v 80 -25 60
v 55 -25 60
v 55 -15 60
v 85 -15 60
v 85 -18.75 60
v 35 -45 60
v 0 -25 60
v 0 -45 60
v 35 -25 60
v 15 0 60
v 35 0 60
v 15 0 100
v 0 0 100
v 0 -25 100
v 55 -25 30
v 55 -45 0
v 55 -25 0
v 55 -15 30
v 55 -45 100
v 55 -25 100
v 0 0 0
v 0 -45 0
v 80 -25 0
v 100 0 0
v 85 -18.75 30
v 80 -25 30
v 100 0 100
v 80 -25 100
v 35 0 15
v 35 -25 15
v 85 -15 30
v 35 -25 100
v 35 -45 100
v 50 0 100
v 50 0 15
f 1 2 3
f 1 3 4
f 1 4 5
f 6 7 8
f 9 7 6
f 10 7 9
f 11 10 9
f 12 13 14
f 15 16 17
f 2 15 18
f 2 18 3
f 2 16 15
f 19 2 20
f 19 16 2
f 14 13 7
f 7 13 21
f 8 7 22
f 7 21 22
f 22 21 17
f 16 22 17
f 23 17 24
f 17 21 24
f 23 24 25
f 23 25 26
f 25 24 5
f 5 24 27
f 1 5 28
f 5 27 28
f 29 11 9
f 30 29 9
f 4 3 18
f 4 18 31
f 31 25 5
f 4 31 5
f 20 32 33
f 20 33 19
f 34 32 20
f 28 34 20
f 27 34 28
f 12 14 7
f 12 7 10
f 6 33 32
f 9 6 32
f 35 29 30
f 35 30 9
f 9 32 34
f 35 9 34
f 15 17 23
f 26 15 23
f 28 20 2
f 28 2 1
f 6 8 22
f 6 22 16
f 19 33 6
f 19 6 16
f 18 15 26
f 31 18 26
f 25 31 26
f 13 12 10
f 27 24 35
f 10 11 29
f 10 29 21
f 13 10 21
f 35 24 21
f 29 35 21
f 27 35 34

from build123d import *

# Parameters (mm, degrees)
F0_W      = 100
F0_H      = 100
F1_DEPTH  = 45
F2_W      = 45
F2_H      = 100
F3_DEPTH  = 20
F4_W      = 35
F4_H      = 45
F5_DEPTH  = 40
F7_DEPTH  = 40
F10_DEPTH = 100.001
F8_W      = 30
F8_H      = 30
F11_DEPTH = 10
F13_DEPTH = 85


with BuildPart() as f1:
    # F0 (on Front) → F1 (new body)
    with BuildSketch(Plane.XZ):
        with Locations((50, 50)):
            Rectangle(F0_W, F0_H)
    extrude(amount=F1_DEPTH)

    # F2 (on face) → F3 (cut)
    with BuildSketch(Plane.XZ.offset(45)):
        with Locations((77.5, 50)):
            Rectangle(F2_W, F2_H)
    extrude(amount=-F3_DEPTH, mode=Mode.SUBTRACT)

    # F4 (on face) → F5 (cut)
    with BuildSketch(Plane.XY.offset(100)):
        with Locations((17.5, -22.5)):
            Rectangle(F4_W, F4_H)
    extrude(amount=-F5_DEPTH, mode=Mode.SUBTRACT)

    # F6 (on face) → F7 (join)
    with BuildSketch(Plane.XY.offset(60)):
        Polygon((15, 0), (0, 0), (0, -25), align=None)
    extrude(amount=F7_DEPTH)

    # F9 (on face) → F10 (cut, through all)
    with BuildSketch(Plane.XY.offset(100)):
        Polygon((100, -25), (100, 0), (80, -25), align=None)
    extrude(amount=-F10_DEPTH, mode=Mode.SUBTRACT)

    # F8 (on face) → F11 (cut)
    with BuildSketch(Plane.XZ.offset(25)):
        with Locations((70, 45)):
            Rectangle(F8_W, F8_H)
    extrude(amount=-F11_DEPTH, mode=Mode.SUBTRACT)

    # F12 (on face) → F13 (cut)
    with BuildSketch(Plane.XY.offset(100)):
        Polygon((50, 0), (35, 0), (35, -25), align=None)
    extrude(amount=-F13_DEPTH, mode=Mode.SUBTRACT)


solid = f1.part
